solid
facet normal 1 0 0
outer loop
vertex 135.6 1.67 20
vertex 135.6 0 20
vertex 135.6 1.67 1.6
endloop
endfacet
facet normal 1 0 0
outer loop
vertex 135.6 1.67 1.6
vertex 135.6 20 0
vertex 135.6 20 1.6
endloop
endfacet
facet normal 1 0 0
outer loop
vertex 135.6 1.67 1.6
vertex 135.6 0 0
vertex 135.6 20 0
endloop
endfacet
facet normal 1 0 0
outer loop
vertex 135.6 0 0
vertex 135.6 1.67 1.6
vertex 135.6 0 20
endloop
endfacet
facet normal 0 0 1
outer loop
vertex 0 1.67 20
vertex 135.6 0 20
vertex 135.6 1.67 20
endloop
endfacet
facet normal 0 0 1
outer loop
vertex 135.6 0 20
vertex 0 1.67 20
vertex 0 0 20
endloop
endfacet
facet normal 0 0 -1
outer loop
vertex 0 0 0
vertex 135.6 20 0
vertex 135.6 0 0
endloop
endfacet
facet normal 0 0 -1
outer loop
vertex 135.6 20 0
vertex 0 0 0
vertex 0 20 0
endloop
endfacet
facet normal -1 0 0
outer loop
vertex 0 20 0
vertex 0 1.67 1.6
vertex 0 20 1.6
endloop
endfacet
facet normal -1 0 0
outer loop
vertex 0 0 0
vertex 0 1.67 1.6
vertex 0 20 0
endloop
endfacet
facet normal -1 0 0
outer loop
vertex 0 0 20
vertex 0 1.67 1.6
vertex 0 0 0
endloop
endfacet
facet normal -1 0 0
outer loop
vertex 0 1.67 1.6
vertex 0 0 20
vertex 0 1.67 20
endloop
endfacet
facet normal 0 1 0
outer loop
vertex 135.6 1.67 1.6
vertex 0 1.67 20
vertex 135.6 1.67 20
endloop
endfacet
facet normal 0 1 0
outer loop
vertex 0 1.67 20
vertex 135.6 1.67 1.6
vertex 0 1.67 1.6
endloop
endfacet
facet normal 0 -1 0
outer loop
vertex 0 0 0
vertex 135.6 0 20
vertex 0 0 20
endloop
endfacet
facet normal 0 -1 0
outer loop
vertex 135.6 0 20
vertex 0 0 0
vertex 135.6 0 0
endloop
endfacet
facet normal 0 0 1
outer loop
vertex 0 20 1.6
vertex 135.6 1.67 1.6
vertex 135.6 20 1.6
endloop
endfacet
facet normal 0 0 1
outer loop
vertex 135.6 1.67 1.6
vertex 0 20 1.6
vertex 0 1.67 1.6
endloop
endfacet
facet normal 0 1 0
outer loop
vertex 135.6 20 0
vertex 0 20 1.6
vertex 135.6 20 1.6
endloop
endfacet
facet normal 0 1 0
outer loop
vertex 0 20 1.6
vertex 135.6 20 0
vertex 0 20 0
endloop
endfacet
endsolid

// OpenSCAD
    // OpenSCAD: BlendeDilbertHalter.scad
// https://openscad.org/cheatsheet/index.html
$fn=36;


w1=135+0.3*2;
h1=20;
d1=1.67;

module Part1() {
    translate([0,0,0]) 
    cube([w1,d1,h1]);
}

Part1();

/////////////////////////////////////////////////

w2=w1;
h2=1.6;
d2=20;

module Part2() {
    translate([0,0,0]) 
    cube([w2,d2,h2]);
}

Part2();
